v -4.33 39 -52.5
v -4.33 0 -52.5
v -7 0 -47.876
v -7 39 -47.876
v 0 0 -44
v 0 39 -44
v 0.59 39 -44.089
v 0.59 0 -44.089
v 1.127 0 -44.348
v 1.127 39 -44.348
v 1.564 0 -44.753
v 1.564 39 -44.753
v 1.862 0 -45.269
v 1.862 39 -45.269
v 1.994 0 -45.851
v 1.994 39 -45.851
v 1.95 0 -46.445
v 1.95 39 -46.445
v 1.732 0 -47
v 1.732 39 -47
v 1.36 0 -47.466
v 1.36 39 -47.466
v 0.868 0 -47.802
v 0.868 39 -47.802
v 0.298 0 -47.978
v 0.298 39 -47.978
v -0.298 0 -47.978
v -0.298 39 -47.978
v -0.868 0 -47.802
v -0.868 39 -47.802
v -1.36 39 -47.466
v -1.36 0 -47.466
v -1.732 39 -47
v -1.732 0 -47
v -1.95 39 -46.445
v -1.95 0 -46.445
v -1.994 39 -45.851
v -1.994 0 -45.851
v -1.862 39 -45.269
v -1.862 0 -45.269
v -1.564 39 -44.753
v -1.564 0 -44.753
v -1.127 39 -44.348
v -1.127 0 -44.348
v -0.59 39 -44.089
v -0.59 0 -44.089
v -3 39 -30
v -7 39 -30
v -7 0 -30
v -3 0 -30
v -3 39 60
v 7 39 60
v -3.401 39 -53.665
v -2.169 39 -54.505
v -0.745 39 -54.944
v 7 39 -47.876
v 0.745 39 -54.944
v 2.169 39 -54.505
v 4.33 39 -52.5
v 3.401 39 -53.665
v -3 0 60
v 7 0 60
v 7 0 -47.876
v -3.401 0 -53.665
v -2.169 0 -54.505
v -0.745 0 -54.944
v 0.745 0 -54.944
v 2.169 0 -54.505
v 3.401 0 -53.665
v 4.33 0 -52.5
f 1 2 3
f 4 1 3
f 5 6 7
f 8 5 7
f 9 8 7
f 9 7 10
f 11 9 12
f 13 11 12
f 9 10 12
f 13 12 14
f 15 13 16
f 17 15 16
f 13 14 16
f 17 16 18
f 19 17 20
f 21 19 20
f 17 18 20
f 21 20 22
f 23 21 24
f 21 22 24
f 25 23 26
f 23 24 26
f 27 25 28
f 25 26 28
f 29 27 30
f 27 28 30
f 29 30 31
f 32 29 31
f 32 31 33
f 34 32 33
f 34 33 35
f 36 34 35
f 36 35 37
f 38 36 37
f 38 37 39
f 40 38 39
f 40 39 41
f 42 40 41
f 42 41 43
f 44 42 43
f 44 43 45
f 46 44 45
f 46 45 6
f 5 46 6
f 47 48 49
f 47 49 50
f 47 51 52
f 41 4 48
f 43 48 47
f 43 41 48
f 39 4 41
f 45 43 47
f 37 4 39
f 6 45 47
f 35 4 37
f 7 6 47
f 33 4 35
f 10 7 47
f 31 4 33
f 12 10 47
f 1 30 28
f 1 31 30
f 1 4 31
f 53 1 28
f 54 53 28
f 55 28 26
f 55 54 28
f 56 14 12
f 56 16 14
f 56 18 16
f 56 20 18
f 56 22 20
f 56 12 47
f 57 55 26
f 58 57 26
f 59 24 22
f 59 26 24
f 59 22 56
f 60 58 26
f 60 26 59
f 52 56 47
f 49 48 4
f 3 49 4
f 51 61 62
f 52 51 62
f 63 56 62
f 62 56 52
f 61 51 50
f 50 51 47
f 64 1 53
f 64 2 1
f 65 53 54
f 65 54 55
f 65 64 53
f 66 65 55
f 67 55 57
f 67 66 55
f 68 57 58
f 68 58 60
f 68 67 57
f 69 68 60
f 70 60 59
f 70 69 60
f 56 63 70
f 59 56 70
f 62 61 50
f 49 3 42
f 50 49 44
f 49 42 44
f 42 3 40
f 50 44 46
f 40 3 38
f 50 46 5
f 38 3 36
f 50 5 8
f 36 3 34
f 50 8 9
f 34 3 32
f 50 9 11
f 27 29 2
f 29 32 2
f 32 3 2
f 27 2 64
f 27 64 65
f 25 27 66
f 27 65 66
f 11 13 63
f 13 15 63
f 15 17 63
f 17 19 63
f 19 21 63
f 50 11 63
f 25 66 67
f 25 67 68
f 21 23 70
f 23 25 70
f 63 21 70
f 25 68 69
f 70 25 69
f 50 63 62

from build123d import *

# Parameters (mm, degrees)
SKETCH1_W           = 30
SKETCH1_H           = 120
BOSS_EXTRUDE1_DEPTH = 39
SKETCH2_OUTSIDE_W   = 57.94
SKETCH2_OUTSIDE_H   = 147.94
CUT_EXTRUDE2_DEPTH  = 74.116345642
FILLET1_R           = 5
CUT_EXTRUDE3_DEPTH  = 74.116345642
SKETCH4_W           = 4
SKETCH4_H           = 90
CUT_EXTRUDE4_DEPTH  = 72.902712049
SKETCH5_R           = 2
CUT_EXTRUDE5_DEPTH  = 72.902712049


with BuildPart() as part:
    # Sketch1 → Boss-Extrude1 (new body)
    with BuildSketch(Plane(origin=(0, 0, 0), x_dir=(1, 0, 0), z_dir=(0, 1, 0))):
        Rectangle(SKETCH1_W, SKETCH1_H)
    extrude(amount=BOSS_EXTRUDE1_DEPTH)

    # Sketch2 outside → Cut-Extrude2 (cut, through all)
    with BuildSketch(Plane(origin=(0, 39, 0), x_dir=(1, 0, 0), z_dir=(0, 1, 0))):
        Rectangle(SKETCH2_OUTSIDE_W, SKETCH2_OUTSIDE_H)
        Polygon((0, 60), (-15, 34.019237886), (-15, -60), (15, -60), (15, 34.019237886), align=None, mode=Mode.SUBTRACT)
    extrude(amount=-CUT_EXTRUDE2_DEPTH, mode=Mode.SUBTRACT)

    # Fillet1
    fillet1_edges = [part.edges().sort_by_distance(p)[0] for p in [
        (0, 19.5, -60),
    ]]
    fillet(fillet1_edges, radius=FILLET1_R)

    # Sketch3 → Cut-Extrude3 (cut, through all)
    with BuildSketch(Plane(origin=(0, 39, 0), x_dir=(1, 0, 0), z_dir=(0, 1, 0))):
        Polygon((-15, 34.019237886), (-15, -60), (-7, -60), (-7, 47.875644347), align=None)
        Polygon((7, 47.875644347), (7, -60), (15, -60), (15, 34.019237886), align=None)
    extrude(amount=-CUT_EXTRUDE3_DEPTH, mode=Mode.SUBTRACT)

    # Sketch4 → Cut-Extrude4 (cut, through all)
    with BuildSketch(Plane(origin=(0, 39, 0), x_dir=(1, 0, 0), z_dir=(0, 1, 0))):
        with Locations((-5, -15)):
            Rectangle(SKETCH4_W, SKETCH4_H)
    extrude(amount=-CUT_EXTRUDE4_DEPTH, mode=Mode.SUBTRACT)

    # Sketch5 → Cut-Extrude5 (cut, through all)
    with BuildSketch(Plane(origin=(0, 39, 0), x_dir=(1, 0, 0), z_dir=(0, 1, 0))):
        with Locations(Location((0, 46, 0), (0, 0, 270))):
            Circle(SKETCH5_R)
    extrude(amount=-CUT_EXTRUDE5_DEPTH, mode=Mode.SUBTRACT)


solid = part.part
